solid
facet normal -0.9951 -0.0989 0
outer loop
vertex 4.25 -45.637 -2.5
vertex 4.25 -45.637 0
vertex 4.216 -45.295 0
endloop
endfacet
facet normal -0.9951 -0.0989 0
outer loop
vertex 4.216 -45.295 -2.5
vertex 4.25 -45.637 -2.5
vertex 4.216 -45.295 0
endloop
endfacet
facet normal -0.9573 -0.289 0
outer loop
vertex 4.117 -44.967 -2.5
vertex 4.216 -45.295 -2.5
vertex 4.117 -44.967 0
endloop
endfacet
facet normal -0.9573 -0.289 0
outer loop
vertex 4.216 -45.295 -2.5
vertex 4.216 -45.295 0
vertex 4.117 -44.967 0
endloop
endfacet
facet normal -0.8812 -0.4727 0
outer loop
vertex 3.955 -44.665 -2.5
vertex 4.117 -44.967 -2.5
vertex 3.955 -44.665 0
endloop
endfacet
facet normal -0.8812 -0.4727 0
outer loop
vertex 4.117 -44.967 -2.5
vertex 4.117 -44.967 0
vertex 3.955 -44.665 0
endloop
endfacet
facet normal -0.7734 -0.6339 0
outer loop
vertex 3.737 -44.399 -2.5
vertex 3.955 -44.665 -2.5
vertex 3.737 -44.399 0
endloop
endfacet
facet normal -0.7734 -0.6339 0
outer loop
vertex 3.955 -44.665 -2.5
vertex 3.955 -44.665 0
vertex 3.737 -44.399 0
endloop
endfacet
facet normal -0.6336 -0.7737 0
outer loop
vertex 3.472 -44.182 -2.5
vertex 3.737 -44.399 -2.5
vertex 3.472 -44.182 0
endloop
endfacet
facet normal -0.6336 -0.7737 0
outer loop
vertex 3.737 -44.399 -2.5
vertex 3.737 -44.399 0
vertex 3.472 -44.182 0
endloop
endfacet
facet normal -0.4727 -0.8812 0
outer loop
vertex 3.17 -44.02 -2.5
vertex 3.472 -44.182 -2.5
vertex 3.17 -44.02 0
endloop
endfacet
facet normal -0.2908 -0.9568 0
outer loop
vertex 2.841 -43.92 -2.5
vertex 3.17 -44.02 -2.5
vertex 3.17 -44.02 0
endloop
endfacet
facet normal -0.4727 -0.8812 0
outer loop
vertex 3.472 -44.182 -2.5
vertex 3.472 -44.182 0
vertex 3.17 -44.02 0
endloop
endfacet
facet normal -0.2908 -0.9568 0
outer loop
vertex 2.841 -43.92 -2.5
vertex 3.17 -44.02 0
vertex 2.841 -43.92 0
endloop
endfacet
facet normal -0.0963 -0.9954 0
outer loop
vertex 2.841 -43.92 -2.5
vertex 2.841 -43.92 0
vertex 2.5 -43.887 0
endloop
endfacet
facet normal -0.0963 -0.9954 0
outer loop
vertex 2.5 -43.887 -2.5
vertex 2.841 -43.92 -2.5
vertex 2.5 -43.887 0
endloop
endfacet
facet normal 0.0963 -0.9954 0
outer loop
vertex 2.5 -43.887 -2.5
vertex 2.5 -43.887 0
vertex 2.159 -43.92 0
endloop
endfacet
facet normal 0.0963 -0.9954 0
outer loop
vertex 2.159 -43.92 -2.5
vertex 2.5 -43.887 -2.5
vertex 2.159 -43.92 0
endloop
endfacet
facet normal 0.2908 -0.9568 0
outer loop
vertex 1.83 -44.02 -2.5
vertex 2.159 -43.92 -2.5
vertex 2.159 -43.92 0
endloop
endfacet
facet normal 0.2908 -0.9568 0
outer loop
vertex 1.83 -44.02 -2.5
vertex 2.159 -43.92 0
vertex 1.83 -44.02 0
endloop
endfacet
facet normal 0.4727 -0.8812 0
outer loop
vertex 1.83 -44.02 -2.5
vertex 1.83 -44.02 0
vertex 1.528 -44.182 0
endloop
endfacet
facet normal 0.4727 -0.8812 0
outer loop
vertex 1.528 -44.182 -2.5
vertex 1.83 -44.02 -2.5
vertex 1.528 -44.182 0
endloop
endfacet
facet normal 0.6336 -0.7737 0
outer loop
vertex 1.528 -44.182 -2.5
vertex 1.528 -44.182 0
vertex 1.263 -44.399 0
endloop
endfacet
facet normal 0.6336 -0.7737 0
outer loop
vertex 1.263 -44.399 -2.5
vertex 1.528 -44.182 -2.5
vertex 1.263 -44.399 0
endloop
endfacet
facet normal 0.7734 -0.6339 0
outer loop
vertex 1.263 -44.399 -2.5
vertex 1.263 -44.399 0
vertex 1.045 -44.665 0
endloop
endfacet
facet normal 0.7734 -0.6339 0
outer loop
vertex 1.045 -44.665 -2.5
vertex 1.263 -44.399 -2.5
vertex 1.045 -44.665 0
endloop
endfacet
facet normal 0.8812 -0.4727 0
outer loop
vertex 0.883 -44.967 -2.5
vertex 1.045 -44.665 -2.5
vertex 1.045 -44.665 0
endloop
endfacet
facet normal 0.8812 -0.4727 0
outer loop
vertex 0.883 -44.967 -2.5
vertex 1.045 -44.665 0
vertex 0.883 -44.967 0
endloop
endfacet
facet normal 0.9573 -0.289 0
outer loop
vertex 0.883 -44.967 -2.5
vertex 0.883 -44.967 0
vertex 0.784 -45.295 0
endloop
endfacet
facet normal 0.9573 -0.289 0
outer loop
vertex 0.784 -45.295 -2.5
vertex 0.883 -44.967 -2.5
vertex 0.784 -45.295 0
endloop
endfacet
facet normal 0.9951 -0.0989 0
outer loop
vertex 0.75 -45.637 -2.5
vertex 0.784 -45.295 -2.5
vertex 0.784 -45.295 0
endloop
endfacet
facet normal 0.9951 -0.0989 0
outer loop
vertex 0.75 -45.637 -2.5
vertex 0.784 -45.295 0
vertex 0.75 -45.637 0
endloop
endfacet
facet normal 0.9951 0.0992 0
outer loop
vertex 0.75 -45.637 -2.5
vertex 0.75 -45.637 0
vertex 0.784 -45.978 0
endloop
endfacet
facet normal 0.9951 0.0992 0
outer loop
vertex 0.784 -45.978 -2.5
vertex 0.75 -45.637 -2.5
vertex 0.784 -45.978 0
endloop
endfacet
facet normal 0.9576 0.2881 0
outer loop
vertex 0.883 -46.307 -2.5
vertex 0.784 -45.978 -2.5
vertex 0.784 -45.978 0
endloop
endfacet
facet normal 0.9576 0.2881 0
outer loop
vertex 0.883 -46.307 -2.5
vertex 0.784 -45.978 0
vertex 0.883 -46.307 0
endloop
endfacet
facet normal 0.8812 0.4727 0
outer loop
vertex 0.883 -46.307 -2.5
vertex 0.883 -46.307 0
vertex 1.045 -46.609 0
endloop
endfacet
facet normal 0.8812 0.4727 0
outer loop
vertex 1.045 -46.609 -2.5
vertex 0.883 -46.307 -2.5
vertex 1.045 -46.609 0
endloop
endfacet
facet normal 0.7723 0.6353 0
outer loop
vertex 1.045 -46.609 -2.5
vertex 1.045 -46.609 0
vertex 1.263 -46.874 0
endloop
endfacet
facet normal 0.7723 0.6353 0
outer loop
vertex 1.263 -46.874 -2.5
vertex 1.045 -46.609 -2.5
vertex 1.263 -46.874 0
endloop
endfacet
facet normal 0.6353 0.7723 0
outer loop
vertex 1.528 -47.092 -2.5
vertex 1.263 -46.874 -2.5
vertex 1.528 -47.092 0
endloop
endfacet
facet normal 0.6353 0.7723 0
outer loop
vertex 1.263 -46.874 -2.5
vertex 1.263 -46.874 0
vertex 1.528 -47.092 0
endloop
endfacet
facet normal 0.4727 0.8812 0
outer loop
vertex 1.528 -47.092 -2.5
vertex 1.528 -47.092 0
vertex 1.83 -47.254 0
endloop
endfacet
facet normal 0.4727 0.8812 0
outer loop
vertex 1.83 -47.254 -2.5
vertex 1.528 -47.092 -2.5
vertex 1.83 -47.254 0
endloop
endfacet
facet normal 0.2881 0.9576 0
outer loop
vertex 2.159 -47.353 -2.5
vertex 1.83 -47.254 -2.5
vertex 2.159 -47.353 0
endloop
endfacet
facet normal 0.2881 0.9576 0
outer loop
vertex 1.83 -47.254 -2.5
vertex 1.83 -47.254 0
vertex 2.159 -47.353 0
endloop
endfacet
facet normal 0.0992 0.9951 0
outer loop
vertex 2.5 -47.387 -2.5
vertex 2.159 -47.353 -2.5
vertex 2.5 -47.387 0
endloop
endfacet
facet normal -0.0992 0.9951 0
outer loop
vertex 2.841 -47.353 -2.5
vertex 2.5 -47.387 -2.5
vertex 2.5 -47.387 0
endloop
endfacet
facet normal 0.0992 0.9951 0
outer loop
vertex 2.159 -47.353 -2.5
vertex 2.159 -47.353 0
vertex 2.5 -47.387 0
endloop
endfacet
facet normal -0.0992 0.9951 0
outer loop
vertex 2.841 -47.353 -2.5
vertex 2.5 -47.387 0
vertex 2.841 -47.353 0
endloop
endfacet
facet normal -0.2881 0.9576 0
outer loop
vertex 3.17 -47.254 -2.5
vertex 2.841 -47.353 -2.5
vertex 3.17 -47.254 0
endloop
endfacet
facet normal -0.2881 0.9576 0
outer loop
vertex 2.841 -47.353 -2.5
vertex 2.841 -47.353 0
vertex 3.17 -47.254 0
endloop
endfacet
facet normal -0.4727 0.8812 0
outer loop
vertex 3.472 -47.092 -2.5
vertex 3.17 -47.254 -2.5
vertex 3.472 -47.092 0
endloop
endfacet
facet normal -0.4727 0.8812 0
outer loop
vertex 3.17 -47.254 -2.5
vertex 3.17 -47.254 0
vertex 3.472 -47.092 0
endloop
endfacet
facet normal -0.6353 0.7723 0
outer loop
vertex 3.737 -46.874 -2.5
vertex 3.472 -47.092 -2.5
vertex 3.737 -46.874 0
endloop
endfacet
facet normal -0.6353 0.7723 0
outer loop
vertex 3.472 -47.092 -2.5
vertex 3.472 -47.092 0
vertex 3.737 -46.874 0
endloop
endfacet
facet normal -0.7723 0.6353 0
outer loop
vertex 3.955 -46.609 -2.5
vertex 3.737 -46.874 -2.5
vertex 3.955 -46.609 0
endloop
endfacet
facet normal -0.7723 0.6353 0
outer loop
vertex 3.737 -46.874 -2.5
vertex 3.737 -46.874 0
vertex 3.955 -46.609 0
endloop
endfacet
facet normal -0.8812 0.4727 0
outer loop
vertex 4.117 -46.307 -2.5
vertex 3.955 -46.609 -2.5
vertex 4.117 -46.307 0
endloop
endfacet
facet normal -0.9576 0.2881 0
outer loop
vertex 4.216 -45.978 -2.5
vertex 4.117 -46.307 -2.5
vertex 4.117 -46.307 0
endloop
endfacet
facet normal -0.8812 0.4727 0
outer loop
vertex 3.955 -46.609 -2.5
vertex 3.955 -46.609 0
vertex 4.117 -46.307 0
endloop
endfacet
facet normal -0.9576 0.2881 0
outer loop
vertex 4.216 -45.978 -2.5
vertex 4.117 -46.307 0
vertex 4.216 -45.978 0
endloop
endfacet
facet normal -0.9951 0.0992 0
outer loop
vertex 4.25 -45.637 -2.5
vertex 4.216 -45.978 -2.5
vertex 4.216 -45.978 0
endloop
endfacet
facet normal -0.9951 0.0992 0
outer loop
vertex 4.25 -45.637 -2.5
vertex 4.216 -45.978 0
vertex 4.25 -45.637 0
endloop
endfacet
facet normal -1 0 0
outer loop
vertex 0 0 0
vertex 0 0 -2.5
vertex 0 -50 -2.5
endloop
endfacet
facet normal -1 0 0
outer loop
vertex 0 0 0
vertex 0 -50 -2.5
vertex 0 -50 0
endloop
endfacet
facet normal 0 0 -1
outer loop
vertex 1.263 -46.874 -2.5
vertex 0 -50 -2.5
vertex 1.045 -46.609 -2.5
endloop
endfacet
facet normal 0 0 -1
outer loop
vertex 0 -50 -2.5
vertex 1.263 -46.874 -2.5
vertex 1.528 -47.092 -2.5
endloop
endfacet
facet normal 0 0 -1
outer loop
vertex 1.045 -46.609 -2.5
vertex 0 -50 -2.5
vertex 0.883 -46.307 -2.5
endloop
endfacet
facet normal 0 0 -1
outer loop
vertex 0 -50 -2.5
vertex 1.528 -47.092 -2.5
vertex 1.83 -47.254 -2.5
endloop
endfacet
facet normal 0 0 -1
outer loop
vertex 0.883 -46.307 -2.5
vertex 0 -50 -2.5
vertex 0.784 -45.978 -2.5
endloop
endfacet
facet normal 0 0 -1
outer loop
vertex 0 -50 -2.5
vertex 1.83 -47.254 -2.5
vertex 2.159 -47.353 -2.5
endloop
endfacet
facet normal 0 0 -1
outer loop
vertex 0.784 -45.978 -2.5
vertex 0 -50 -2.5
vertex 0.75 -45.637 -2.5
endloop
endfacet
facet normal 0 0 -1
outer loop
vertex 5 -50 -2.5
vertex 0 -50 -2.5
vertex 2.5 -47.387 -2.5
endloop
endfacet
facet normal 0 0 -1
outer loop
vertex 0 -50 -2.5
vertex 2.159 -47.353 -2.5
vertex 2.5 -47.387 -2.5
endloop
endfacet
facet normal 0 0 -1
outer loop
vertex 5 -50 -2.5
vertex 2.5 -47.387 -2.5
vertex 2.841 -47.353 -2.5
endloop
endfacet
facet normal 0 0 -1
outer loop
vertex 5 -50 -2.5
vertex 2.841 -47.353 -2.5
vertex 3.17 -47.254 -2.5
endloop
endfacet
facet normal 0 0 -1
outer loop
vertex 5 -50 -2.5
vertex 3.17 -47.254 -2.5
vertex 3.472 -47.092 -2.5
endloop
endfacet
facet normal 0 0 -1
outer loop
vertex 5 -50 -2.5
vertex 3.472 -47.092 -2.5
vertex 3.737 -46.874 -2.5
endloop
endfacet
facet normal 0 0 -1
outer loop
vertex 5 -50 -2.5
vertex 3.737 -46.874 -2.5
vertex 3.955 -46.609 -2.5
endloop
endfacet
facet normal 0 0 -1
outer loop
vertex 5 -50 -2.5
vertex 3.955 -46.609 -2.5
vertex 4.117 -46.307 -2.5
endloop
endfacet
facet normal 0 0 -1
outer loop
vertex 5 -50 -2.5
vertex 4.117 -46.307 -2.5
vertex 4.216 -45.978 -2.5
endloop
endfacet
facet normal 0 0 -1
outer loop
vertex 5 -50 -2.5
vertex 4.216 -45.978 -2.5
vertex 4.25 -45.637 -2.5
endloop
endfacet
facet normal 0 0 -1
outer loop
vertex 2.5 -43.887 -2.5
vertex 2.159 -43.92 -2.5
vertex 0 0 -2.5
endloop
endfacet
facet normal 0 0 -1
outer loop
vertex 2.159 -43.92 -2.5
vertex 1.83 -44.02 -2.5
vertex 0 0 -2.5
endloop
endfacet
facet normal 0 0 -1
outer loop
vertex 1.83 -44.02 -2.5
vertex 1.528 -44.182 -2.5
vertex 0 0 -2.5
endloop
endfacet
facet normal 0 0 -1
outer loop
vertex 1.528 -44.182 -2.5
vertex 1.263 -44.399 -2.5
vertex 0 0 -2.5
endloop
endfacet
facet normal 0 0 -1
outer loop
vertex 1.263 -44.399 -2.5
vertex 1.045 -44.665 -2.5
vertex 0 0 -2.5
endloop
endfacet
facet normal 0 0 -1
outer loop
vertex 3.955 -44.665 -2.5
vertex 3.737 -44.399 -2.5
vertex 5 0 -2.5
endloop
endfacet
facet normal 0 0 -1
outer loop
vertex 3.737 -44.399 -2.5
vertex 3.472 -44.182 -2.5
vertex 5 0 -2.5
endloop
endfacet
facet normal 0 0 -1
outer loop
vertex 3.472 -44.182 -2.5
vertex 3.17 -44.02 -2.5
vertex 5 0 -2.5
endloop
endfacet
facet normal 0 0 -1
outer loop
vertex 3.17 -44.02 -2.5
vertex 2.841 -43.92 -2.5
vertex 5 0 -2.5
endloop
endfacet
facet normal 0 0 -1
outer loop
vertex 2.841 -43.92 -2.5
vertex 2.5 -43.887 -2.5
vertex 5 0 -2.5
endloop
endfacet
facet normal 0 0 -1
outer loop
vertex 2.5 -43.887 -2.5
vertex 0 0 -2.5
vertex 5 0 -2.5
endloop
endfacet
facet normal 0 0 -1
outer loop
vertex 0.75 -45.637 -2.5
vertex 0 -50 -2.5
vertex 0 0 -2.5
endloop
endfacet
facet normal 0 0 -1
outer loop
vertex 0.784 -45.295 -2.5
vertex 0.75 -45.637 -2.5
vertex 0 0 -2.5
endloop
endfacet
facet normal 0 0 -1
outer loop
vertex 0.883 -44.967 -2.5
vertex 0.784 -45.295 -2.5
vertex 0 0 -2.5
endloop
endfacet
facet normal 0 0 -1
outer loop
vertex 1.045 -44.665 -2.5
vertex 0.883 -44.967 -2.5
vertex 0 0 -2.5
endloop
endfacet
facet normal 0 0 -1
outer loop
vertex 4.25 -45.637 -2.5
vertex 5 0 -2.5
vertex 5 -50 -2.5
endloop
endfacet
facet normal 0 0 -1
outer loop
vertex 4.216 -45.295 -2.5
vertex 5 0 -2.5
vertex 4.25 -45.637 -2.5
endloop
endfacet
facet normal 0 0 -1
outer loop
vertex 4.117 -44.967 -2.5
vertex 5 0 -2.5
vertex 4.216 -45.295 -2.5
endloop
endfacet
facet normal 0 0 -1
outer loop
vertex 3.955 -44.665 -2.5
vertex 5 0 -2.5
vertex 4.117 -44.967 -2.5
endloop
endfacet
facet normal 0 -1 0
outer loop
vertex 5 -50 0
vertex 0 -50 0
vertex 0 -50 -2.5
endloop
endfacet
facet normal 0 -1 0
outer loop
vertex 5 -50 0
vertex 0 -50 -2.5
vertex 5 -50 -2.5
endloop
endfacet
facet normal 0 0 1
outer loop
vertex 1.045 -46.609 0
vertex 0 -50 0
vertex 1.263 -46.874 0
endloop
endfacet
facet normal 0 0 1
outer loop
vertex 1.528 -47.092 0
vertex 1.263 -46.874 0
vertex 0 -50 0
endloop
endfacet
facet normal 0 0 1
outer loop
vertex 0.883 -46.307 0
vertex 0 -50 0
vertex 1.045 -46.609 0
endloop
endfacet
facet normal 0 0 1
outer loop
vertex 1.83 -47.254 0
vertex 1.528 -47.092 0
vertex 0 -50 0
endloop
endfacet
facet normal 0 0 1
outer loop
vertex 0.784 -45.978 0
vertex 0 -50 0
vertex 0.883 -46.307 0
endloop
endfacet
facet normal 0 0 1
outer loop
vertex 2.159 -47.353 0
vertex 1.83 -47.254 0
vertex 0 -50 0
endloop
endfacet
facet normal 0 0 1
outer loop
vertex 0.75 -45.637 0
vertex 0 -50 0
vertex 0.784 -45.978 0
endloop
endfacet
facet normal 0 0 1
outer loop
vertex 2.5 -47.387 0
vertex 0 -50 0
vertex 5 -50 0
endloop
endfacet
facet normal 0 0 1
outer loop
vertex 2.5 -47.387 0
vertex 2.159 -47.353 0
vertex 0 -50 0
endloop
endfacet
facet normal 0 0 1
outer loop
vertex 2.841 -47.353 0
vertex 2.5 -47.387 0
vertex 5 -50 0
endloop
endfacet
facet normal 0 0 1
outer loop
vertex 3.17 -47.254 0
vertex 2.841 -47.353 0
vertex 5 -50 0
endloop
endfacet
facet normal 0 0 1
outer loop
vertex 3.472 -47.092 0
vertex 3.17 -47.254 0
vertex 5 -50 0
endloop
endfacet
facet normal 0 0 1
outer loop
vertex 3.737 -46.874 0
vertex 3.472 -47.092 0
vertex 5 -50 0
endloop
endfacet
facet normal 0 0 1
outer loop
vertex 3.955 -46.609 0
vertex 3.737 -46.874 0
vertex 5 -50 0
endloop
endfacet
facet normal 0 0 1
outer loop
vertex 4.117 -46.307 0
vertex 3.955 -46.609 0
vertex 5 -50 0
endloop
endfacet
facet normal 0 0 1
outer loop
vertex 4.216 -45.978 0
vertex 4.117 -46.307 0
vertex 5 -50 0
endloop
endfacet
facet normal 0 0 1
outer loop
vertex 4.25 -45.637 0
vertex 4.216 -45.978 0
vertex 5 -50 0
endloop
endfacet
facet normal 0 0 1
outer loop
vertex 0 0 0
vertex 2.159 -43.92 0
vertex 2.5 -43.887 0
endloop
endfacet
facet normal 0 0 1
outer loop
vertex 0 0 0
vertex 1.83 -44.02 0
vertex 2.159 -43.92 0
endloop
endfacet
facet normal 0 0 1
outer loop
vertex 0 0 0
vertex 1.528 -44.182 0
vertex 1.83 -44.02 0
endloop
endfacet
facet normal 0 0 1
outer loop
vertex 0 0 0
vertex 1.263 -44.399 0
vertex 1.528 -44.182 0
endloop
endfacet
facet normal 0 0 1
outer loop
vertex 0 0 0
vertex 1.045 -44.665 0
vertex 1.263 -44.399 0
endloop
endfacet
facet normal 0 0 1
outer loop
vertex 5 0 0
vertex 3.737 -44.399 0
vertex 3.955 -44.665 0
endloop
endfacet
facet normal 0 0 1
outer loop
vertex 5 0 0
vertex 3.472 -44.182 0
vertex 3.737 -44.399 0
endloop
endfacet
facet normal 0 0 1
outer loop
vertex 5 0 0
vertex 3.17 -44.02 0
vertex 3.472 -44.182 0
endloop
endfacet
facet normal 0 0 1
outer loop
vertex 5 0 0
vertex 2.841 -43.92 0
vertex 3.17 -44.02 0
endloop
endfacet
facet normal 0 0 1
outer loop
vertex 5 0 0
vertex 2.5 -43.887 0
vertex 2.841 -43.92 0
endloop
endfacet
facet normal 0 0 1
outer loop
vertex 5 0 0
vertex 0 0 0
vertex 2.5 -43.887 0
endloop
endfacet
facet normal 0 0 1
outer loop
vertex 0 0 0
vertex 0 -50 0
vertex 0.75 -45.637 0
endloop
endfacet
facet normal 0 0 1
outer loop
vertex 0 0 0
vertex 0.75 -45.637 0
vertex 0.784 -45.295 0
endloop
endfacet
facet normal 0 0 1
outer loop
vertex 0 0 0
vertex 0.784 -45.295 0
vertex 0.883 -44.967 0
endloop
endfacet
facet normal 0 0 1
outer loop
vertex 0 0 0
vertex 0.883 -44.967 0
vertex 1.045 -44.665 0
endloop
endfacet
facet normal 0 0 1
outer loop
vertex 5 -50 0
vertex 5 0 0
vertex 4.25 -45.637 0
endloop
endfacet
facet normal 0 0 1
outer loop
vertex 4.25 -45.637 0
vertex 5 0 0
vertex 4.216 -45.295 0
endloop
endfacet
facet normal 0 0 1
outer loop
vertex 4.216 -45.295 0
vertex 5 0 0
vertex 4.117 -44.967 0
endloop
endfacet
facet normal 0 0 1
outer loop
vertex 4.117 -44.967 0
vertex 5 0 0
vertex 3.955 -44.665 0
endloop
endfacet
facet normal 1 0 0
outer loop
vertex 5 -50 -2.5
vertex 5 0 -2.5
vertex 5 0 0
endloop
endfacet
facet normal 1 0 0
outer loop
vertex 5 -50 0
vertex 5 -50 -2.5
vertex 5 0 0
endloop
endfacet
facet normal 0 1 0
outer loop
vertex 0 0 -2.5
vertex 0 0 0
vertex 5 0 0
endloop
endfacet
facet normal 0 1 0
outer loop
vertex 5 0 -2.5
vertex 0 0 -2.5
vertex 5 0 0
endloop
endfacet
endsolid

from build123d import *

# Parameters (mm, degrees)
F0_W     = 5
F0_H     = 2.5
F1_DEPTH = 50
F2_R     = 1.75
F3_DEPTH = 25


with BuildPart() as f1:
    # F0 (on Front) → F1 (new body)
    with BuildSketch(Plane.XZ):
        with Locations((2.5, -1.25)):
            Rectangle(F0_W, F0_H)
    extrude(amount=F1_DEPTH)

    # F2 (on face) → F3 (cut)
    with BuildSketch(Plane.XY):
        with Locations((2.5, -45.636852)):
            Circle(F2_R)
    extrude(amount=-F3_DEPTH, mode=Mode.SUBTRACT)


solid = f1.part
